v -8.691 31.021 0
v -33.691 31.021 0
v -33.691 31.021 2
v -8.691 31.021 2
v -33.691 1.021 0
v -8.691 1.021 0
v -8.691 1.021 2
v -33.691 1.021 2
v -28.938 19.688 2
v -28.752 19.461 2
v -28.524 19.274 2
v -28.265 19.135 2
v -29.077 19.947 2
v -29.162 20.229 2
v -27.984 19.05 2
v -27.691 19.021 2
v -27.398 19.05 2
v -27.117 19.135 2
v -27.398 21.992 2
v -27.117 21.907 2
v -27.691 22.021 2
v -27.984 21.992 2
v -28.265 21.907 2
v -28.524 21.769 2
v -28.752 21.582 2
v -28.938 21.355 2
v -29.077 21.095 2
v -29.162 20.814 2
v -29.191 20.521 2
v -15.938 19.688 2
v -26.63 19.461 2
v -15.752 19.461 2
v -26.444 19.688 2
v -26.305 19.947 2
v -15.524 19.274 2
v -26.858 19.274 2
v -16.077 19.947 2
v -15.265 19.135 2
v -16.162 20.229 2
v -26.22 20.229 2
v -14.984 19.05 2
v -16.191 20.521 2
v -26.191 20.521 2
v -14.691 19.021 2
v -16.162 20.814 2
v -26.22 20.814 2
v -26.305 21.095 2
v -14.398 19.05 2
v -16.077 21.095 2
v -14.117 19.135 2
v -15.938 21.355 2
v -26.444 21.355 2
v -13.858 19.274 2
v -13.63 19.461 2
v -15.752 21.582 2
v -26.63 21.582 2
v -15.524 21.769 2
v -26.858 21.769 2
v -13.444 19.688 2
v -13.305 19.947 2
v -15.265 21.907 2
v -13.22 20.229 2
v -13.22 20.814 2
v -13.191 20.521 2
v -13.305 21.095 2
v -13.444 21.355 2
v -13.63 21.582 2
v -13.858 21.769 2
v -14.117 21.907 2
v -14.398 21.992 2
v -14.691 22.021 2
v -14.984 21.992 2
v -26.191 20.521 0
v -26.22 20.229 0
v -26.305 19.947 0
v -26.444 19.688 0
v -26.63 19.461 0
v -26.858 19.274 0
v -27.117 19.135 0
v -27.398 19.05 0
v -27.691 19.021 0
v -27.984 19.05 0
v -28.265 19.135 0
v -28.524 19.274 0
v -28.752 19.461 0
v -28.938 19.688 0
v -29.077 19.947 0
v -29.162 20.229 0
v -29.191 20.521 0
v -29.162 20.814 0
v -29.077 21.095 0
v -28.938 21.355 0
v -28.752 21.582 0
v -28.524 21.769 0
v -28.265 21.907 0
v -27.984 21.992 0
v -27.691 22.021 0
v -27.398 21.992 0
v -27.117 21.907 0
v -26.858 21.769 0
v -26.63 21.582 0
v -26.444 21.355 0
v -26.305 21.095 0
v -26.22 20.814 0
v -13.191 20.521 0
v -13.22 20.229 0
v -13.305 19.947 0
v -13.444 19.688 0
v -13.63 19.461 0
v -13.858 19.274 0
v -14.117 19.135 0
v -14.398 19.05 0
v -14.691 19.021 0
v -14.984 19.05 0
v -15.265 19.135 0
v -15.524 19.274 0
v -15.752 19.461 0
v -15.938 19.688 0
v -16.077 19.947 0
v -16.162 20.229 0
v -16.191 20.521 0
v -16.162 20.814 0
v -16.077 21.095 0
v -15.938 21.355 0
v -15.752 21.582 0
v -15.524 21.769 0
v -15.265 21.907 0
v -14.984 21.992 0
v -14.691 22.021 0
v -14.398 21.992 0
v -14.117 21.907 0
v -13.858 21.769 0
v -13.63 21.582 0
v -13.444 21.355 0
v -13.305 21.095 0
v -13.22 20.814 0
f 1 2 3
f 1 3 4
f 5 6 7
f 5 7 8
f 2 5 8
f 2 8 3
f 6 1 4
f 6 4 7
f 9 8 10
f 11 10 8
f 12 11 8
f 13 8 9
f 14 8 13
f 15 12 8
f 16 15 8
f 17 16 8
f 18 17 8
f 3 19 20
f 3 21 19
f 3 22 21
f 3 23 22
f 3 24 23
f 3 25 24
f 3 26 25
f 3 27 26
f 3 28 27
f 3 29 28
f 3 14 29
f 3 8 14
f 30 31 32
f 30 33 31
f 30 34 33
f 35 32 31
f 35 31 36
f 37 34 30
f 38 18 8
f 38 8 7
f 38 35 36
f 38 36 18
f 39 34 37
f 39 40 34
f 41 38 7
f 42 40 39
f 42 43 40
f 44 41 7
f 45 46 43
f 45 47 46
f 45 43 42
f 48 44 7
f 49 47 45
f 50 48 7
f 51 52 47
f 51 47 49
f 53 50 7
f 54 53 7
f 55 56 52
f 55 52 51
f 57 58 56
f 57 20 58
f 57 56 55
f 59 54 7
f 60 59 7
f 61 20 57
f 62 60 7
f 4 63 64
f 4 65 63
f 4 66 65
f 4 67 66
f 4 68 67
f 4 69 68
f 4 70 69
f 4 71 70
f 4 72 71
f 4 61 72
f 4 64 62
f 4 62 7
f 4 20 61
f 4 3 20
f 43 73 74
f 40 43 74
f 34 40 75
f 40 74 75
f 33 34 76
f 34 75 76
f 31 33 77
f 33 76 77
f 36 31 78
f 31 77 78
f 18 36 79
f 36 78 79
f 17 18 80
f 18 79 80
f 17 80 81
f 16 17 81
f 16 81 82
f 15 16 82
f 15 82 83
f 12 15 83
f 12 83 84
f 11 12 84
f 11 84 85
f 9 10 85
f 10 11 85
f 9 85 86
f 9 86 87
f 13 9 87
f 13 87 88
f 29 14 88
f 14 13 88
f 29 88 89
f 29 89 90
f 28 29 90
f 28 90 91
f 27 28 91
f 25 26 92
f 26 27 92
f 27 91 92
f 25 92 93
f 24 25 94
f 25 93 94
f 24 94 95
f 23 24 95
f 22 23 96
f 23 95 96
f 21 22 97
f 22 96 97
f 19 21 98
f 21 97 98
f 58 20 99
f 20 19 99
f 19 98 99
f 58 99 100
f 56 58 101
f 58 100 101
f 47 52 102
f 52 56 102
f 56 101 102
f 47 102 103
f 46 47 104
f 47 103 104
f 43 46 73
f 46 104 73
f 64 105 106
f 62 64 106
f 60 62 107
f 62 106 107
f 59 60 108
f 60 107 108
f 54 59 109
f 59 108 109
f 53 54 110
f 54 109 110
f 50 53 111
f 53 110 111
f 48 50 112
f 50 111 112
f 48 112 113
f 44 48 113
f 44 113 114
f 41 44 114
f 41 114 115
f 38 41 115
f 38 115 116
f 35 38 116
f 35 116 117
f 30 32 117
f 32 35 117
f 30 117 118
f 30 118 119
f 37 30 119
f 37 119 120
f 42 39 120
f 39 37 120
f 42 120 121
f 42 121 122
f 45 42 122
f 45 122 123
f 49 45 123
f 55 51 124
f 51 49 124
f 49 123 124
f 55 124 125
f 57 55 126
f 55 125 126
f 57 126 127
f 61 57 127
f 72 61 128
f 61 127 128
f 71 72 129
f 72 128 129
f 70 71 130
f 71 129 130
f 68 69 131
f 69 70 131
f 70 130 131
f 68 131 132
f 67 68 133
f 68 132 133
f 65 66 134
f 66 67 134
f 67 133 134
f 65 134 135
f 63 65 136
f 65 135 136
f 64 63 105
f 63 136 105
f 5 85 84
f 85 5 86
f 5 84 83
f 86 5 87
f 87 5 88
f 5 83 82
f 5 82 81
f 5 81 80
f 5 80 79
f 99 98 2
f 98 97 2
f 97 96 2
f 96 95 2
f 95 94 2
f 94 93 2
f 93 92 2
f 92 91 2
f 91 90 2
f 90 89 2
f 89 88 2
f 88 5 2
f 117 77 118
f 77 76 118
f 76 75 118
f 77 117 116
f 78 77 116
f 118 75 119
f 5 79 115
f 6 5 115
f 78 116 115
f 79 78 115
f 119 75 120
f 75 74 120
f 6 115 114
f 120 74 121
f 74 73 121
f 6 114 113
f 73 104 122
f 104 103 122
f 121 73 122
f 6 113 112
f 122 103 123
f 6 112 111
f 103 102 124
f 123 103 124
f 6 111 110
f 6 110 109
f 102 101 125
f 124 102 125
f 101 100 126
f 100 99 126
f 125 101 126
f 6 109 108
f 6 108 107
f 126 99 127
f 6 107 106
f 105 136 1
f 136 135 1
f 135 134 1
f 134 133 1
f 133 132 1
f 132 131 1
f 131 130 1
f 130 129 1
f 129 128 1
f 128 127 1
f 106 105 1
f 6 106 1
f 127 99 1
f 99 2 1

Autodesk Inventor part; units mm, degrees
ref_plane "YZ Plane" through (0, 0, 0) normal (1, 0, 0) x (0, 1, 0)
ref_plane "XZ Plane" through (0, 0, 0) normal (0, 1, 0) x (-1, 0, 0)
ref_plane "XY Plane" through (0, 0, 0) normal (0, 0, 1) x (1, 0, 0)
sketch "Sketch1" plane through (0, 0, 0) normal (0, 0, 1) x (1, 0, 0)
  line L0 (-33.6909, 31.0213) -> (-8.6909, 31.0213)
  line L1 (-8.6909, 31.0213) -> (-8.6909, 1.0213)
  line L2 (-8.6909, 1.0213) -> (-33.6909, 1.0213)
  line L3 (-33.6909, 1.0213) -> (-33.6909, 31.0213)
  circle A0 centre (-27.6909, 20.5213) radius 1.5
  circle A1 centre (-14.6909, 20.5213) radius 1.5
  line L4 (-21.1909, 1.0213) -> (-21.1909, 31.0213)
  line L5 (-33.6909, 16.0213) -> (-8.6909, 16.0213)
  dimension "d0" = 25
  dimension "d1" = 30
  dimension "d4" = 3
  dimension "d5" = 3
  dimension "d6" = 13
  dimension "d7" = 6
  dimension "d8" = 10.5
extrude "Extrusion1" add sketch "Sketch1" along normal blind 2
equation "\"d4\" = d5"
properties part number "Placa PCB 30x25"
